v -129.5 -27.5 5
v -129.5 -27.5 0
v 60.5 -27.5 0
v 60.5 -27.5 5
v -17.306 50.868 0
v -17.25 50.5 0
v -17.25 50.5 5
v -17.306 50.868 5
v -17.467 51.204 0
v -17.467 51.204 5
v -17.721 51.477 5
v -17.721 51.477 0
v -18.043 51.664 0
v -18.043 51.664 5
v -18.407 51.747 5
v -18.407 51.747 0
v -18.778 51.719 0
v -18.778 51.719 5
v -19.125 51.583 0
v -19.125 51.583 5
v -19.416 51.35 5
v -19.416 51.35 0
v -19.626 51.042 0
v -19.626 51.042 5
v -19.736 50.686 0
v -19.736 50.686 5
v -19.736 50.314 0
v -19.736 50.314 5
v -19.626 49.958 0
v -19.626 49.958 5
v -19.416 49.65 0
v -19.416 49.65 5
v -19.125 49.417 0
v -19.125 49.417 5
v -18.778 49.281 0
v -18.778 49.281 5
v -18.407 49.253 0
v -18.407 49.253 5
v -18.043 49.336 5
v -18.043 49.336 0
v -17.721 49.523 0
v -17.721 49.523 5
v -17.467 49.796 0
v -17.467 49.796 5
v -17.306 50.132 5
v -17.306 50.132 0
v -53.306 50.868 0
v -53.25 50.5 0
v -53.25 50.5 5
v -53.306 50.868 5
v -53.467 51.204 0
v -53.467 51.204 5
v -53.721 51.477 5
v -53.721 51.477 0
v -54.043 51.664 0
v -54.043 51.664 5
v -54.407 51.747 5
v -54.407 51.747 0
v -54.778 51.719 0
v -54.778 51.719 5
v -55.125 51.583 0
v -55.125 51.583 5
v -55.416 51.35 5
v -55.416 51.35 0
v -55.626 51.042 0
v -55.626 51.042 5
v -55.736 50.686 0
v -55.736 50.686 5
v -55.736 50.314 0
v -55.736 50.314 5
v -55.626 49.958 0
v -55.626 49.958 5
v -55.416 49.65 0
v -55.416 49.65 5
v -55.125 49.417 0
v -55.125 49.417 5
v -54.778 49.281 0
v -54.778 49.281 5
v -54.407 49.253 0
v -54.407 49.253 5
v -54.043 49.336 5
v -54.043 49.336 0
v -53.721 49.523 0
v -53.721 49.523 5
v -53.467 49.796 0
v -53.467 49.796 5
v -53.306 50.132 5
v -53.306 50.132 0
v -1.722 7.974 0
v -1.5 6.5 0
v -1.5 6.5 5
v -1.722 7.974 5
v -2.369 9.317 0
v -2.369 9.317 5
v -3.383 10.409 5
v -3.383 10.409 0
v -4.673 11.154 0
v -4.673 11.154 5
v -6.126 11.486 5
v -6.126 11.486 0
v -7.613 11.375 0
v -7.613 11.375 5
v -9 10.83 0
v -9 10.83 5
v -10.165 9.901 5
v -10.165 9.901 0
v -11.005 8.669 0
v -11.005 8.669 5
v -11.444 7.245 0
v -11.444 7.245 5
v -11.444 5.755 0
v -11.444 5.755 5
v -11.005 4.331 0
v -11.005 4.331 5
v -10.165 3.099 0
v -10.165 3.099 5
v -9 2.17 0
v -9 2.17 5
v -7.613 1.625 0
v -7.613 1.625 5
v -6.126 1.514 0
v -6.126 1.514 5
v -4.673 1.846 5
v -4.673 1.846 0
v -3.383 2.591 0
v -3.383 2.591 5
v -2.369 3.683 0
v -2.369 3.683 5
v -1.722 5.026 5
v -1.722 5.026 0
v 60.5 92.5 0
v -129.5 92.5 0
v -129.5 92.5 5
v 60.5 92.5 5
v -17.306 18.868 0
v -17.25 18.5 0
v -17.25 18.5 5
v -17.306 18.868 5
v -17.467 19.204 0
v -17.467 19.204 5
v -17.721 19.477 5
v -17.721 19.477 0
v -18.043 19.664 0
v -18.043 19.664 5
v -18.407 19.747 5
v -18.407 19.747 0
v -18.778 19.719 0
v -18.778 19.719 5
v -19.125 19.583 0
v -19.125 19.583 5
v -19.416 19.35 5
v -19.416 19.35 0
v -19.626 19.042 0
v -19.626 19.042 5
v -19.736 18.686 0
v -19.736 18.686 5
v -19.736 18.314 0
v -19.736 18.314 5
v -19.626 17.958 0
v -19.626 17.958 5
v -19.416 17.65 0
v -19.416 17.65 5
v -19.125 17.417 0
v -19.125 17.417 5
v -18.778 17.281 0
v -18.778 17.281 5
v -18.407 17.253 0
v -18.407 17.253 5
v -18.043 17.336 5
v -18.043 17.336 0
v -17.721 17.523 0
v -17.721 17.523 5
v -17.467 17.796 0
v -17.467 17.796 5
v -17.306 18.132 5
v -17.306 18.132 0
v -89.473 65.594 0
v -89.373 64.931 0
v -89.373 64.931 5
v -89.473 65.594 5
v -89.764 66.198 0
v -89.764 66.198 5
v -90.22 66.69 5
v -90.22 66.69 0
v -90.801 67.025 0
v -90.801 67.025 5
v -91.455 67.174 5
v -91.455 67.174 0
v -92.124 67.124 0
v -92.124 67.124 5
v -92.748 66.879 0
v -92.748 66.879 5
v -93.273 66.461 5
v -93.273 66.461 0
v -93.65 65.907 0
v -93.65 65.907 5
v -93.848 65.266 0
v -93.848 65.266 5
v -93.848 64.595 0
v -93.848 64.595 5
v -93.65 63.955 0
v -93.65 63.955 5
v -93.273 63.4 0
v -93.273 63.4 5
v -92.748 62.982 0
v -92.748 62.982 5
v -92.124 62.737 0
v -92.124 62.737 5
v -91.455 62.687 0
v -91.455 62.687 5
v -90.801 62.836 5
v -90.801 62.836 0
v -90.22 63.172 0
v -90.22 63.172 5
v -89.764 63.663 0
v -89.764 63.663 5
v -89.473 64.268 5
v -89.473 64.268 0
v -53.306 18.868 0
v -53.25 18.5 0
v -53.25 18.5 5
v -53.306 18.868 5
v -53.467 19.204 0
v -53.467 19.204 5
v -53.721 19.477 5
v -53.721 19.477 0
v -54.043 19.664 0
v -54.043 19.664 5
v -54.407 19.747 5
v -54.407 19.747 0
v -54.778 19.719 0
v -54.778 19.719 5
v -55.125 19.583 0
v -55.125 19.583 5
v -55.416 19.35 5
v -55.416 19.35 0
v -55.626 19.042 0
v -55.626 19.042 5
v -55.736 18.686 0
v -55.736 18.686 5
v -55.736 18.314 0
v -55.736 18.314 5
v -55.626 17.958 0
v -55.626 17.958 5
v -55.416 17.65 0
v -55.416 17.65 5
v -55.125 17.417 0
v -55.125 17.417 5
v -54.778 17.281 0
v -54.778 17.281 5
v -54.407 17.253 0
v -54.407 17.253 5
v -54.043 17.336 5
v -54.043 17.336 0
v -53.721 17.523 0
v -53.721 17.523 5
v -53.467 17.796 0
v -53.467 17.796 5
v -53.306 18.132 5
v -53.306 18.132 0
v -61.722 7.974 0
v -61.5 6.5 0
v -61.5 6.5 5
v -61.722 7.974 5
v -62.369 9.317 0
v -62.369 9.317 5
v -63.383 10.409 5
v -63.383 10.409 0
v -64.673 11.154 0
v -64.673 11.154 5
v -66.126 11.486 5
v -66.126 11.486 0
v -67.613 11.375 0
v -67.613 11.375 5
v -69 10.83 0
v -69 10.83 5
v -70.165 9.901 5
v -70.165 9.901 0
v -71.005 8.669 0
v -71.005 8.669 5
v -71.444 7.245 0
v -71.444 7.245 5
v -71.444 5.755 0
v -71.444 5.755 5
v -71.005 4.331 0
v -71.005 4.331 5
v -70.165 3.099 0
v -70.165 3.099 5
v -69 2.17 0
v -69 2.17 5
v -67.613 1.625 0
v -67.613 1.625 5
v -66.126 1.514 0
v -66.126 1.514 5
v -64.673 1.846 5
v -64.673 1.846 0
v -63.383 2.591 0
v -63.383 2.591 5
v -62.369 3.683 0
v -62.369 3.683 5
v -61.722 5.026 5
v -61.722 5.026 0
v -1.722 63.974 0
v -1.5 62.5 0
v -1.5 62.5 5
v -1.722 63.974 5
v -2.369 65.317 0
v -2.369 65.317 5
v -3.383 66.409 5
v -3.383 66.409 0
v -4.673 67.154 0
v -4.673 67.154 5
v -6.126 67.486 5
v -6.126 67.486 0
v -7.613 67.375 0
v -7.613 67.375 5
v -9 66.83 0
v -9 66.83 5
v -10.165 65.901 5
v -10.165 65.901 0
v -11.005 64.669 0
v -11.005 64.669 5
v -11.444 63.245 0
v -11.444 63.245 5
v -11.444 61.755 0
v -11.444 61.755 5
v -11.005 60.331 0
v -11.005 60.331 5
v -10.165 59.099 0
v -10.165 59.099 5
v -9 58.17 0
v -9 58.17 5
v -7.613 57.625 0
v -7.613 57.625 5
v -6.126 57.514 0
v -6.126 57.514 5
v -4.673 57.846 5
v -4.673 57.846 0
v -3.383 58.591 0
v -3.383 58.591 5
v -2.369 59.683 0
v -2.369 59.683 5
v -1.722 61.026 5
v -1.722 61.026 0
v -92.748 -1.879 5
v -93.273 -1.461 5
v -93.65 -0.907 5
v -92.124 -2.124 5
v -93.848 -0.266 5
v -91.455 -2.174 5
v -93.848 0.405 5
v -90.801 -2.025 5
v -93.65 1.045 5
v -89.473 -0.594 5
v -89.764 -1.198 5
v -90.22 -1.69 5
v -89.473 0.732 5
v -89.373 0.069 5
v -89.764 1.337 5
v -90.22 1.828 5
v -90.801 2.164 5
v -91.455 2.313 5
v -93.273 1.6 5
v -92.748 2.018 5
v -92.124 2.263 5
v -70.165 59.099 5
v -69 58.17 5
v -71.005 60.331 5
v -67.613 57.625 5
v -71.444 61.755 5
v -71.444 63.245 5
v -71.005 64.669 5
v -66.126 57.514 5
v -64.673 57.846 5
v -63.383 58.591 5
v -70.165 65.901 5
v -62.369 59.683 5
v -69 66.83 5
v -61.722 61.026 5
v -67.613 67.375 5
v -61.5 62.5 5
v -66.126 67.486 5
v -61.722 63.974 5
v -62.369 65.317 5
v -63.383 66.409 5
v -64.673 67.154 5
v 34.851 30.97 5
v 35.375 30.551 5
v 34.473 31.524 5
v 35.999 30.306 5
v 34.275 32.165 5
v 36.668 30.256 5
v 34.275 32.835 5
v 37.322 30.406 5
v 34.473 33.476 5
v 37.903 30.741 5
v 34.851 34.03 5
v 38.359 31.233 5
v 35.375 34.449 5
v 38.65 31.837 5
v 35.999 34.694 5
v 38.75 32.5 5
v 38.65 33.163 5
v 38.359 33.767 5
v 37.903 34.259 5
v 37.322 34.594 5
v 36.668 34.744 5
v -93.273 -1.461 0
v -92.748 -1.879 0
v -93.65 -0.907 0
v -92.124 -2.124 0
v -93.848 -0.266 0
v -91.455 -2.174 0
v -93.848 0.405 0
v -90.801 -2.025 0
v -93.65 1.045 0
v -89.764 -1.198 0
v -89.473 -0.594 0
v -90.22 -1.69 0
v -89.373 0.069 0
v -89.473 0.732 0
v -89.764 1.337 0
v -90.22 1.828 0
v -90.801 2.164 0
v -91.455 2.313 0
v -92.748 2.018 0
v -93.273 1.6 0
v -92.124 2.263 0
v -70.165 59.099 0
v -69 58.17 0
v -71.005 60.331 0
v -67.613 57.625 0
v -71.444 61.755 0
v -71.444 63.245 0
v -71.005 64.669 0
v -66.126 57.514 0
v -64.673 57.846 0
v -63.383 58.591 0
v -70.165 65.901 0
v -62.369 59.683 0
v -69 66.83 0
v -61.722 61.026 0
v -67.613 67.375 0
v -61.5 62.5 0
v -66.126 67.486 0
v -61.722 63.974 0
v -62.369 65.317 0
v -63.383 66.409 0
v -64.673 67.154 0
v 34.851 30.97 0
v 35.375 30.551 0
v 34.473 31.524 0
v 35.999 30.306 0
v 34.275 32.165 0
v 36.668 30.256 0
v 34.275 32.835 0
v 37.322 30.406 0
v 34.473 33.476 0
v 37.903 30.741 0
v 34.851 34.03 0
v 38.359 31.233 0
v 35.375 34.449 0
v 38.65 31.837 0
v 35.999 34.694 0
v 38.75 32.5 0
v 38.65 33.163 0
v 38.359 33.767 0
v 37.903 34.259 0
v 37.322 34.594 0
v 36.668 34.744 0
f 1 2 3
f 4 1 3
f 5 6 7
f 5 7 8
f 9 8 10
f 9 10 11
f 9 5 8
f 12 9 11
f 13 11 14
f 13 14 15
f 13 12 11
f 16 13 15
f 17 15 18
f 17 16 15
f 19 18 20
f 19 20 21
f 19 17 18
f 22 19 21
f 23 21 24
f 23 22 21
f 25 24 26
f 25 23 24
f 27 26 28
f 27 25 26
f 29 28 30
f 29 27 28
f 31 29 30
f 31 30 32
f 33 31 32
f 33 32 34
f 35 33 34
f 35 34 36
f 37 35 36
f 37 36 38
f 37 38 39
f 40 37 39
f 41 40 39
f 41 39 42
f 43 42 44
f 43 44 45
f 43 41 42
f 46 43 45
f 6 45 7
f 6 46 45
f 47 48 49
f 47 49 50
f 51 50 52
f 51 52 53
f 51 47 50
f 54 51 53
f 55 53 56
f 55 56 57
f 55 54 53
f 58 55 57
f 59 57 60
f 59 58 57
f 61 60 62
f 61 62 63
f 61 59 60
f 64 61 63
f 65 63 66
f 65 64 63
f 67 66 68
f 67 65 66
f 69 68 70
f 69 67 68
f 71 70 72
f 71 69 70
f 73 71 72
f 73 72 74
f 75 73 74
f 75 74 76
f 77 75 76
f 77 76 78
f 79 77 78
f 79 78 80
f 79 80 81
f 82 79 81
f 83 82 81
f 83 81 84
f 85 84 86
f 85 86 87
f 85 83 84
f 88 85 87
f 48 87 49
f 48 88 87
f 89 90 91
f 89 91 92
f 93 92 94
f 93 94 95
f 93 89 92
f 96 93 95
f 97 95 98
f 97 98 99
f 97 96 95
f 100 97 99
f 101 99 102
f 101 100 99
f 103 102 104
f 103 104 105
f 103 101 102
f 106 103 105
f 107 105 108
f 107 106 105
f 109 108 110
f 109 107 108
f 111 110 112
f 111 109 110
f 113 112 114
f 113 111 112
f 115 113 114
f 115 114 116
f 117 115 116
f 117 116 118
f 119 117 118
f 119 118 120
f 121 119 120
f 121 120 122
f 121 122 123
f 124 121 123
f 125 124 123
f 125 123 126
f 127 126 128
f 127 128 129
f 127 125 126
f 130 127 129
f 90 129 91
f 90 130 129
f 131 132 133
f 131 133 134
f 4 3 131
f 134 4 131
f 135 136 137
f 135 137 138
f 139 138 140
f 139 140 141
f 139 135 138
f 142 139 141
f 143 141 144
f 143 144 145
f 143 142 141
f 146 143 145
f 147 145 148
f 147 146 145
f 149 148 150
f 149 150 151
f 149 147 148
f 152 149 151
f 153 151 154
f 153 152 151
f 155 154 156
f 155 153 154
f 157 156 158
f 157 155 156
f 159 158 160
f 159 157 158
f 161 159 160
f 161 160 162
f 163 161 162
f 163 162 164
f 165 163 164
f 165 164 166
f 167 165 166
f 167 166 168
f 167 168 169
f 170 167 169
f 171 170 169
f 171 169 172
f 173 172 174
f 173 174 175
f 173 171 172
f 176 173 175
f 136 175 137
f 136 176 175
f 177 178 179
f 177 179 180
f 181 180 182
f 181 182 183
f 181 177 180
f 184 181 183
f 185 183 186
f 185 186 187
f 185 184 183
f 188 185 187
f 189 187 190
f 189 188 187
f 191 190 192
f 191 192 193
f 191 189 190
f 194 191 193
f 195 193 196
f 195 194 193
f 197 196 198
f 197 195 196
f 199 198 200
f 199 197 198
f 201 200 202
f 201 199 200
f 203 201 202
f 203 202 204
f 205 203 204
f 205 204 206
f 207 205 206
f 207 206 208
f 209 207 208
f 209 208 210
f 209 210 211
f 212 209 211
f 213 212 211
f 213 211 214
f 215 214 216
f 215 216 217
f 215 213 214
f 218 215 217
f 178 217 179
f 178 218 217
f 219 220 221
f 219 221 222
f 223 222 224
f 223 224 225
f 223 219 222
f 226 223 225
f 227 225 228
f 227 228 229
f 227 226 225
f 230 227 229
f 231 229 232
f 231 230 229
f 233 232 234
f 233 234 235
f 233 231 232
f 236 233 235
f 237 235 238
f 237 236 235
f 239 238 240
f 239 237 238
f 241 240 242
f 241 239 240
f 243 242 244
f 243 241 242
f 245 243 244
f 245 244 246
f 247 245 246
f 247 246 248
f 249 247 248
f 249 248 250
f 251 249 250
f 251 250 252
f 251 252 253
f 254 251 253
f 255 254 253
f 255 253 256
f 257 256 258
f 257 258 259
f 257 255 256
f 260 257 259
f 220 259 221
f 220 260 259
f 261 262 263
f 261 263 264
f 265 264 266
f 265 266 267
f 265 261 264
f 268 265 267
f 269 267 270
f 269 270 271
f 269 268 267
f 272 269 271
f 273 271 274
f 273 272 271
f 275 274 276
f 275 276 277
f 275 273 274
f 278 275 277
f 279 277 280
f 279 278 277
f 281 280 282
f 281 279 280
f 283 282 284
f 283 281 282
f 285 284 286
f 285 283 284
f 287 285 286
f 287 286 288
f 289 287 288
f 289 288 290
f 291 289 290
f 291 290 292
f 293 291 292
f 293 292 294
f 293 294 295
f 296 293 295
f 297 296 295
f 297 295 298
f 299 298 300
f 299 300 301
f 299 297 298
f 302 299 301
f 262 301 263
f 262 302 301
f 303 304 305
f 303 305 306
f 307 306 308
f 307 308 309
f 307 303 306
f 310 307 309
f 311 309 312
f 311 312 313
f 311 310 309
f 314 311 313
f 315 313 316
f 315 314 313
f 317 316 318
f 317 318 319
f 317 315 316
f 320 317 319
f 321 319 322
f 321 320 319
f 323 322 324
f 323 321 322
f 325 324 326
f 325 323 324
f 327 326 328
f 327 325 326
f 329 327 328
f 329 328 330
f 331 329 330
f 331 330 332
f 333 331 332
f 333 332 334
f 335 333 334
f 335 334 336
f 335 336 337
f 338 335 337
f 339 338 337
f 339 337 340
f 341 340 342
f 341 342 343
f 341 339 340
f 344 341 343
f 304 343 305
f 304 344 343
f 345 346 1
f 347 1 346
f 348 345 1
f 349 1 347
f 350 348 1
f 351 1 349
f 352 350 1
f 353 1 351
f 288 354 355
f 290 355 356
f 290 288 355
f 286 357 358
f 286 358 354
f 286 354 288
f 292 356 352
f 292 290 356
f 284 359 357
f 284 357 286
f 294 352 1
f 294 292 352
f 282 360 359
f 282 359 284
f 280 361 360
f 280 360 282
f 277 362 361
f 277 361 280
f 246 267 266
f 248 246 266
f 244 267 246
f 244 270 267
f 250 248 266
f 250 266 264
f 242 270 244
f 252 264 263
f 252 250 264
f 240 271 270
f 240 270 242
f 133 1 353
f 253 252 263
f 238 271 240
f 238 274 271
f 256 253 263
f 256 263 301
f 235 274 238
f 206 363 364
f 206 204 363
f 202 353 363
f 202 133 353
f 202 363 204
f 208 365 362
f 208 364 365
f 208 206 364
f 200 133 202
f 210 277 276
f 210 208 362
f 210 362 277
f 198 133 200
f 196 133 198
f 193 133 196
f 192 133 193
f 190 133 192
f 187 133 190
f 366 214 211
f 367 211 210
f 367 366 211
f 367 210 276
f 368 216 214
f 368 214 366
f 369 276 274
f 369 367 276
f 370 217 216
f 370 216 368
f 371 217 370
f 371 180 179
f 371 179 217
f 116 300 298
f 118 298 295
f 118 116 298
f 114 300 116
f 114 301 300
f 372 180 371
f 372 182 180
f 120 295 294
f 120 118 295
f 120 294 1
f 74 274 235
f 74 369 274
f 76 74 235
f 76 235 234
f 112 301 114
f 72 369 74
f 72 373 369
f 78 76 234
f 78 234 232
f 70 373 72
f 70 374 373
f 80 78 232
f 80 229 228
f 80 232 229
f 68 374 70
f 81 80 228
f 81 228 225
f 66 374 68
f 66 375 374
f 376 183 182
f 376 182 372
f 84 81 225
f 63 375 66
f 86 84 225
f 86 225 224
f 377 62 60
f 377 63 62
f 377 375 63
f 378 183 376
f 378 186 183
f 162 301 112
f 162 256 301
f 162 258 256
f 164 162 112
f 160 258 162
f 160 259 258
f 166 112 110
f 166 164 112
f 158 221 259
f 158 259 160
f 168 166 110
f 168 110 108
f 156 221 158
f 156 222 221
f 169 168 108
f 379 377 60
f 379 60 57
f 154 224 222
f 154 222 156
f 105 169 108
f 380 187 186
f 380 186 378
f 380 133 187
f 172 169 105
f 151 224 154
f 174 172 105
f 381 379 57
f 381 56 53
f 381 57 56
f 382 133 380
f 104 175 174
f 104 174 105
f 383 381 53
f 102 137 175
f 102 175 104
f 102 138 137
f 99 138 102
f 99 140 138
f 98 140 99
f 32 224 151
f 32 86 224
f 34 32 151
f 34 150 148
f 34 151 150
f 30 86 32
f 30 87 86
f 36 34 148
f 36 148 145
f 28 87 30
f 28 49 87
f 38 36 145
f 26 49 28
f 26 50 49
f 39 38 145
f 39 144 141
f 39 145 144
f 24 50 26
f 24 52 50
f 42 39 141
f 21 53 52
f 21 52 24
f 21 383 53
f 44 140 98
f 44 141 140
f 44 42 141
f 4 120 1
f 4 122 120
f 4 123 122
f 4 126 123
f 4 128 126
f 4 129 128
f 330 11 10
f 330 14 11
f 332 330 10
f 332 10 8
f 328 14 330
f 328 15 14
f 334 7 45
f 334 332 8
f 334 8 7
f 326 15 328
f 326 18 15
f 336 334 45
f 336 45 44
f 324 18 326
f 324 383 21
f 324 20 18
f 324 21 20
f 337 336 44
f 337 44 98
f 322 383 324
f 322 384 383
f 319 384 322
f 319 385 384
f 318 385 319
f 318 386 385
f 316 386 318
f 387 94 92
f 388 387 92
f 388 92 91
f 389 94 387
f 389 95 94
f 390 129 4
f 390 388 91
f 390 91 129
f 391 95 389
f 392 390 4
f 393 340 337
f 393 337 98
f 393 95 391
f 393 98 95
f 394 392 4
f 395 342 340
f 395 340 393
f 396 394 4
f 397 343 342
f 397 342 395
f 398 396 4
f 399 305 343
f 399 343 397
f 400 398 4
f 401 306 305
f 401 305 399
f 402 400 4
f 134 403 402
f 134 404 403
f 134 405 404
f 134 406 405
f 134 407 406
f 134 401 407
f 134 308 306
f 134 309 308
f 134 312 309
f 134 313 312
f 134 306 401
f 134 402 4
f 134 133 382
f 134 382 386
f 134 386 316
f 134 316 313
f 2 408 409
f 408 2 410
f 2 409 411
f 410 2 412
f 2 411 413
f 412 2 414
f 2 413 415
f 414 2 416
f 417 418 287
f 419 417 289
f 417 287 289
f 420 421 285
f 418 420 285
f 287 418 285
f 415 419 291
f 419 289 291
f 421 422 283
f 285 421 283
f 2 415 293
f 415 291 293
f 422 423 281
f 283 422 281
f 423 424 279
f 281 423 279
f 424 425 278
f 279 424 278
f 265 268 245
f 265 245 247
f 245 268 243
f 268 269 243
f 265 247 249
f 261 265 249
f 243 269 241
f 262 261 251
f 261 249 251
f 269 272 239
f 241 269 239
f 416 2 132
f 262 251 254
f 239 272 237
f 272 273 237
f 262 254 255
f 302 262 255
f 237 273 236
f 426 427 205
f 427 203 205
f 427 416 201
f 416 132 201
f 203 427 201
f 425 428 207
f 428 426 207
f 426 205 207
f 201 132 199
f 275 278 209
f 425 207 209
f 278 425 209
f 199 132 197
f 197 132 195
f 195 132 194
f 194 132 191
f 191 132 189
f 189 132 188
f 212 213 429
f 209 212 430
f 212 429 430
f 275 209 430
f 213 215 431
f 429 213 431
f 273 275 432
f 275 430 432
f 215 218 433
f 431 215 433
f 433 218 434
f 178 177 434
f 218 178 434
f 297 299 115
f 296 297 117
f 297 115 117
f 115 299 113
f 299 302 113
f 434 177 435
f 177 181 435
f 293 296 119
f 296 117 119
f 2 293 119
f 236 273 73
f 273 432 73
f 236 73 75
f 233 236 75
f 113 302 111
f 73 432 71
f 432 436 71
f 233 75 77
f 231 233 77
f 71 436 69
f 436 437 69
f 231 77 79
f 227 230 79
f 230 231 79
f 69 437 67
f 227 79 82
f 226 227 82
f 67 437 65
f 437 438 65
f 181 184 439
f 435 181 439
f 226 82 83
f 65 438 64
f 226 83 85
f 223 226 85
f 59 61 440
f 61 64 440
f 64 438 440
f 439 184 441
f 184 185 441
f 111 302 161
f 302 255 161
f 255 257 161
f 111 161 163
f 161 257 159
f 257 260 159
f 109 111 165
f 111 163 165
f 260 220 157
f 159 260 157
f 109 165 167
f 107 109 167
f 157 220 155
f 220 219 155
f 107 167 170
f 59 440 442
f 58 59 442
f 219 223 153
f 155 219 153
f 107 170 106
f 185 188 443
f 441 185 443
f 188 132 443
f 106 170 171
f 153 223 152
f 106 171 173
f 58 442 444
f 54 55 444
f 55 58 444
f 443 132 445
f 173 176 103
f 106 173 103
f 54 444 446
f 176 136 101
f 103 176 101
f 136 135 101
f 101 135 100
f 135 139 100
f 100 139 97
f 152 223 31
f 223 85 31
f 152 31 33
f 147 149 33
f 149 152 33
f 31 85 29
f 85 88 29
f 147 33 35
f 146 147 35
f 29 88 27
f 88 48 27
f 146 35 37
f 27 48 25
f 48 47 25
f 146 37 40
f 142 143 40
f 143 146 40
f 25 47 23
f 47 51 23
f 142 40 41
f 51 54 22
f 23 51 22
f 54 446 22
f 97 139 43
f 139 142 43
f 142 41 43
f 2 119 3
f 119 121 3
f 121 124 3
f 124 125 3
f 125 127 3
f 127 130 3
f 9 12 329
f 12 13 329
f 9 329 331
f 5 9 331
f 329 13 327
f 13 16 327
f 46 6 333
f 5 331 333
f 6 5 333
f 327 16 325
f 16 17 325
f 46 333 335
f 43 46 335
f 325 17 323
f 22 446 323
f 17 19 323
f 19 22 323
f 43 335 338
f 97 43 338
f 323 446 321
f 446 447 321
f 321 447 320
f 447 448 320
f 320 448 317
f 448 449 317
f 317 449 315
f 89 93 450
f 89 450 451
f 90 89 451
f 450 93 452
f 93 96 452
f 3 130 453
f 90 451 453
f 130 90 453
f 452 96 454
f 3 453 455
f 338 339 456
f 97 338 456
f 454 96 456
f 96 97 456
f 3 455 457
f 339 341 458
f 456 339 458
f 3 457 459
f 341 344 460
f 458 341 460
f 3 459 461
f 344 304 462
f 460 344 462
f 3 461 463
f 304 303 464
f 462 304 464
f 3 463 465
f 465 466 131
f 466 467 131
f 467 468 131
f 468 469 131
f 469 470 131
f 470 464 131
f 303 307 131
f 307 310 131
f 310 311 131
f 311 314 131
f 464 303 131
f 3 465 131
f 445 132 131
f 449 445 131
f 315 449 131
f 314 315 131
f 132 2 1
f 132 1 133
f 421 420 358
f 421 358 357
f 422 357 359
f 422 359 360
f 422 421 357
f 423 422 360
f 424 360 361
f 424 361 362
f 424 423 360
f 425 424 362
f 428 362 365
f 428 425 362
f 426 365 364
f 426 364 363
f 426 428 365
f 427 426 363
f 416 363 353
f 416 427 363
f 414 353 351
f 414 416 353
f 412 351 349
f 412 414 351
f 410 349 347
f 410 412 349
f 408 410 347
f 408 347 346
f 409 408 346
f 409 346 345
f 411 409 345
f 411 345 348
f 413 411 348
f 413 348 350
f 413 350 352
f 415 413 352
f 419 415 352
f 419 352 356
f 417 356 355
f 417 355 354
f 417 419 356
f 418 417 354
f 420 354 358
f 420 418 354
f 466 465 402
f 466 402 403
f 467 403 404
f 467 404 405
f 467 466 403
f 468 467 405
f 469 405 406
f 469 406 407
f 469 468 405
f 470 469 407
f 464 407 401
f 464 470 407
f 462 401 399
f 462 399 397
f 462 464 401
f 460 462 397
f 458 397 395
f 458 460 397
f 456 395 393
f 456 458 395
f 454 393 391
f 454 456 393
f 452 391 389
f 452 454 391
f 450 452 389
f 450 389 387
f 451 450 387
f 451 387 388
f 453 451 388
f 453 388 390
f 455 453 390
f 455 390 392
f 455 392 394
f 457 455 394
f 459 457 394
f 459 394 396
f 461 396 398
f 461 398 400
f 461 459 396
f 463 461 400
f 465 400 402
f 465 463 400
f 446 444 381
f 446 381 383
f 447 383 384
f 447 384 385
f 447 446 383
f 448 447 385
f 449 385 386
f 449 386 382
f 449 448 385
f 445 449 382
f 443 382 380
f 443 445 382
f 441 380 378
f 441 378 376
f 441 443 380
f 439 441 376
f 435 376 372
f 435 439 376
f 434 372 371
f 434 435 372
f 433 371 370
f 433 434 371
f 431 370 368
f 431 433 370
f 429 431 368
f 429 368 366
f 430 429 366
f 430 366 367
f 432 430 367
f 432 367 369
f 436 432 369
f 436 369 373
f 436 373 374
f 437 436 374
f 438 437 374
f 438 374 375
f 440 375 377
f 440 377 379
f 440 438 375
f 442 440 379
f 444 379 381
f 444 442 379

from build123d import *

# Parameters (mm, degrees)
CROQUIS1_W              = 190
CROQUIS1_H              = 120
CROQUIS1_R              = 2.25
CROQUIS1_R_2            = 5
CROQUIS1_R_3            = 1.25
SALIENTE_EXTRUIR1_DEPTH = 5


with BuildPart() as part:
    # Croquis1 → Saliente-Extruir1 (new body)
    with BuildSketch(Plane.XY):
        with Locations((-34.5, 32.5)):
            Rectangle(CROQUIS1_W, CROQUIS1_H)
        with Locations((36.5, 32.5)):
            Circle(CROQUIS1_R, mode=Mode.SUBTRACT)
        with Locations((-91.623199077, 0.069259856)):
            Circle(CROQUIS1_R, mode=Mode.SUBTRACT)
        with Locations((-91.623199077, 64.930740144)):
            Circle(CROQUIS1_R, mode=Mode.SUBTRACT)
        with Locations((-66.5, 62.5)):
            Circle(CROQUIS1_R_2, mode=Mode.SUBTRACT)
        with Locations((-6.5, 62.5)):
            Circle(CROQUIS1_R_2, mode=Mode.SUBTRACT)
        with Locations((-6.5, 6.5)):
            Circle(CROQUIS1_R_2, mode=Mode.SUBTRACT)
        with Locations((-66.5, 6.5)):
            Circle(CROQUIS1_R_2, mode=Mode.SUBTRACT)
        with Locations((-54.5, 50.5)):
            Circle(CROQUIS1_R_3, mode=Mode.SUBTRACT)
        with Locations((-18.5, 50.5)):
            Circle(CROQUIS1_R_3, mode=Mode.SUBTRACT)
        with Locations((-18.5, 18.5)):
            Circle(CROQUIS1_R_3, mode=Mode.SUBTRACT)
        with Locations((-54.5, 18.5)):
            Circle(CROQUIS1_R_3, mode=Mode.SUBTRACT)
    extrude(amount=SALIENTE_EXTRUIR1_DEPTH)


solid = part.part
